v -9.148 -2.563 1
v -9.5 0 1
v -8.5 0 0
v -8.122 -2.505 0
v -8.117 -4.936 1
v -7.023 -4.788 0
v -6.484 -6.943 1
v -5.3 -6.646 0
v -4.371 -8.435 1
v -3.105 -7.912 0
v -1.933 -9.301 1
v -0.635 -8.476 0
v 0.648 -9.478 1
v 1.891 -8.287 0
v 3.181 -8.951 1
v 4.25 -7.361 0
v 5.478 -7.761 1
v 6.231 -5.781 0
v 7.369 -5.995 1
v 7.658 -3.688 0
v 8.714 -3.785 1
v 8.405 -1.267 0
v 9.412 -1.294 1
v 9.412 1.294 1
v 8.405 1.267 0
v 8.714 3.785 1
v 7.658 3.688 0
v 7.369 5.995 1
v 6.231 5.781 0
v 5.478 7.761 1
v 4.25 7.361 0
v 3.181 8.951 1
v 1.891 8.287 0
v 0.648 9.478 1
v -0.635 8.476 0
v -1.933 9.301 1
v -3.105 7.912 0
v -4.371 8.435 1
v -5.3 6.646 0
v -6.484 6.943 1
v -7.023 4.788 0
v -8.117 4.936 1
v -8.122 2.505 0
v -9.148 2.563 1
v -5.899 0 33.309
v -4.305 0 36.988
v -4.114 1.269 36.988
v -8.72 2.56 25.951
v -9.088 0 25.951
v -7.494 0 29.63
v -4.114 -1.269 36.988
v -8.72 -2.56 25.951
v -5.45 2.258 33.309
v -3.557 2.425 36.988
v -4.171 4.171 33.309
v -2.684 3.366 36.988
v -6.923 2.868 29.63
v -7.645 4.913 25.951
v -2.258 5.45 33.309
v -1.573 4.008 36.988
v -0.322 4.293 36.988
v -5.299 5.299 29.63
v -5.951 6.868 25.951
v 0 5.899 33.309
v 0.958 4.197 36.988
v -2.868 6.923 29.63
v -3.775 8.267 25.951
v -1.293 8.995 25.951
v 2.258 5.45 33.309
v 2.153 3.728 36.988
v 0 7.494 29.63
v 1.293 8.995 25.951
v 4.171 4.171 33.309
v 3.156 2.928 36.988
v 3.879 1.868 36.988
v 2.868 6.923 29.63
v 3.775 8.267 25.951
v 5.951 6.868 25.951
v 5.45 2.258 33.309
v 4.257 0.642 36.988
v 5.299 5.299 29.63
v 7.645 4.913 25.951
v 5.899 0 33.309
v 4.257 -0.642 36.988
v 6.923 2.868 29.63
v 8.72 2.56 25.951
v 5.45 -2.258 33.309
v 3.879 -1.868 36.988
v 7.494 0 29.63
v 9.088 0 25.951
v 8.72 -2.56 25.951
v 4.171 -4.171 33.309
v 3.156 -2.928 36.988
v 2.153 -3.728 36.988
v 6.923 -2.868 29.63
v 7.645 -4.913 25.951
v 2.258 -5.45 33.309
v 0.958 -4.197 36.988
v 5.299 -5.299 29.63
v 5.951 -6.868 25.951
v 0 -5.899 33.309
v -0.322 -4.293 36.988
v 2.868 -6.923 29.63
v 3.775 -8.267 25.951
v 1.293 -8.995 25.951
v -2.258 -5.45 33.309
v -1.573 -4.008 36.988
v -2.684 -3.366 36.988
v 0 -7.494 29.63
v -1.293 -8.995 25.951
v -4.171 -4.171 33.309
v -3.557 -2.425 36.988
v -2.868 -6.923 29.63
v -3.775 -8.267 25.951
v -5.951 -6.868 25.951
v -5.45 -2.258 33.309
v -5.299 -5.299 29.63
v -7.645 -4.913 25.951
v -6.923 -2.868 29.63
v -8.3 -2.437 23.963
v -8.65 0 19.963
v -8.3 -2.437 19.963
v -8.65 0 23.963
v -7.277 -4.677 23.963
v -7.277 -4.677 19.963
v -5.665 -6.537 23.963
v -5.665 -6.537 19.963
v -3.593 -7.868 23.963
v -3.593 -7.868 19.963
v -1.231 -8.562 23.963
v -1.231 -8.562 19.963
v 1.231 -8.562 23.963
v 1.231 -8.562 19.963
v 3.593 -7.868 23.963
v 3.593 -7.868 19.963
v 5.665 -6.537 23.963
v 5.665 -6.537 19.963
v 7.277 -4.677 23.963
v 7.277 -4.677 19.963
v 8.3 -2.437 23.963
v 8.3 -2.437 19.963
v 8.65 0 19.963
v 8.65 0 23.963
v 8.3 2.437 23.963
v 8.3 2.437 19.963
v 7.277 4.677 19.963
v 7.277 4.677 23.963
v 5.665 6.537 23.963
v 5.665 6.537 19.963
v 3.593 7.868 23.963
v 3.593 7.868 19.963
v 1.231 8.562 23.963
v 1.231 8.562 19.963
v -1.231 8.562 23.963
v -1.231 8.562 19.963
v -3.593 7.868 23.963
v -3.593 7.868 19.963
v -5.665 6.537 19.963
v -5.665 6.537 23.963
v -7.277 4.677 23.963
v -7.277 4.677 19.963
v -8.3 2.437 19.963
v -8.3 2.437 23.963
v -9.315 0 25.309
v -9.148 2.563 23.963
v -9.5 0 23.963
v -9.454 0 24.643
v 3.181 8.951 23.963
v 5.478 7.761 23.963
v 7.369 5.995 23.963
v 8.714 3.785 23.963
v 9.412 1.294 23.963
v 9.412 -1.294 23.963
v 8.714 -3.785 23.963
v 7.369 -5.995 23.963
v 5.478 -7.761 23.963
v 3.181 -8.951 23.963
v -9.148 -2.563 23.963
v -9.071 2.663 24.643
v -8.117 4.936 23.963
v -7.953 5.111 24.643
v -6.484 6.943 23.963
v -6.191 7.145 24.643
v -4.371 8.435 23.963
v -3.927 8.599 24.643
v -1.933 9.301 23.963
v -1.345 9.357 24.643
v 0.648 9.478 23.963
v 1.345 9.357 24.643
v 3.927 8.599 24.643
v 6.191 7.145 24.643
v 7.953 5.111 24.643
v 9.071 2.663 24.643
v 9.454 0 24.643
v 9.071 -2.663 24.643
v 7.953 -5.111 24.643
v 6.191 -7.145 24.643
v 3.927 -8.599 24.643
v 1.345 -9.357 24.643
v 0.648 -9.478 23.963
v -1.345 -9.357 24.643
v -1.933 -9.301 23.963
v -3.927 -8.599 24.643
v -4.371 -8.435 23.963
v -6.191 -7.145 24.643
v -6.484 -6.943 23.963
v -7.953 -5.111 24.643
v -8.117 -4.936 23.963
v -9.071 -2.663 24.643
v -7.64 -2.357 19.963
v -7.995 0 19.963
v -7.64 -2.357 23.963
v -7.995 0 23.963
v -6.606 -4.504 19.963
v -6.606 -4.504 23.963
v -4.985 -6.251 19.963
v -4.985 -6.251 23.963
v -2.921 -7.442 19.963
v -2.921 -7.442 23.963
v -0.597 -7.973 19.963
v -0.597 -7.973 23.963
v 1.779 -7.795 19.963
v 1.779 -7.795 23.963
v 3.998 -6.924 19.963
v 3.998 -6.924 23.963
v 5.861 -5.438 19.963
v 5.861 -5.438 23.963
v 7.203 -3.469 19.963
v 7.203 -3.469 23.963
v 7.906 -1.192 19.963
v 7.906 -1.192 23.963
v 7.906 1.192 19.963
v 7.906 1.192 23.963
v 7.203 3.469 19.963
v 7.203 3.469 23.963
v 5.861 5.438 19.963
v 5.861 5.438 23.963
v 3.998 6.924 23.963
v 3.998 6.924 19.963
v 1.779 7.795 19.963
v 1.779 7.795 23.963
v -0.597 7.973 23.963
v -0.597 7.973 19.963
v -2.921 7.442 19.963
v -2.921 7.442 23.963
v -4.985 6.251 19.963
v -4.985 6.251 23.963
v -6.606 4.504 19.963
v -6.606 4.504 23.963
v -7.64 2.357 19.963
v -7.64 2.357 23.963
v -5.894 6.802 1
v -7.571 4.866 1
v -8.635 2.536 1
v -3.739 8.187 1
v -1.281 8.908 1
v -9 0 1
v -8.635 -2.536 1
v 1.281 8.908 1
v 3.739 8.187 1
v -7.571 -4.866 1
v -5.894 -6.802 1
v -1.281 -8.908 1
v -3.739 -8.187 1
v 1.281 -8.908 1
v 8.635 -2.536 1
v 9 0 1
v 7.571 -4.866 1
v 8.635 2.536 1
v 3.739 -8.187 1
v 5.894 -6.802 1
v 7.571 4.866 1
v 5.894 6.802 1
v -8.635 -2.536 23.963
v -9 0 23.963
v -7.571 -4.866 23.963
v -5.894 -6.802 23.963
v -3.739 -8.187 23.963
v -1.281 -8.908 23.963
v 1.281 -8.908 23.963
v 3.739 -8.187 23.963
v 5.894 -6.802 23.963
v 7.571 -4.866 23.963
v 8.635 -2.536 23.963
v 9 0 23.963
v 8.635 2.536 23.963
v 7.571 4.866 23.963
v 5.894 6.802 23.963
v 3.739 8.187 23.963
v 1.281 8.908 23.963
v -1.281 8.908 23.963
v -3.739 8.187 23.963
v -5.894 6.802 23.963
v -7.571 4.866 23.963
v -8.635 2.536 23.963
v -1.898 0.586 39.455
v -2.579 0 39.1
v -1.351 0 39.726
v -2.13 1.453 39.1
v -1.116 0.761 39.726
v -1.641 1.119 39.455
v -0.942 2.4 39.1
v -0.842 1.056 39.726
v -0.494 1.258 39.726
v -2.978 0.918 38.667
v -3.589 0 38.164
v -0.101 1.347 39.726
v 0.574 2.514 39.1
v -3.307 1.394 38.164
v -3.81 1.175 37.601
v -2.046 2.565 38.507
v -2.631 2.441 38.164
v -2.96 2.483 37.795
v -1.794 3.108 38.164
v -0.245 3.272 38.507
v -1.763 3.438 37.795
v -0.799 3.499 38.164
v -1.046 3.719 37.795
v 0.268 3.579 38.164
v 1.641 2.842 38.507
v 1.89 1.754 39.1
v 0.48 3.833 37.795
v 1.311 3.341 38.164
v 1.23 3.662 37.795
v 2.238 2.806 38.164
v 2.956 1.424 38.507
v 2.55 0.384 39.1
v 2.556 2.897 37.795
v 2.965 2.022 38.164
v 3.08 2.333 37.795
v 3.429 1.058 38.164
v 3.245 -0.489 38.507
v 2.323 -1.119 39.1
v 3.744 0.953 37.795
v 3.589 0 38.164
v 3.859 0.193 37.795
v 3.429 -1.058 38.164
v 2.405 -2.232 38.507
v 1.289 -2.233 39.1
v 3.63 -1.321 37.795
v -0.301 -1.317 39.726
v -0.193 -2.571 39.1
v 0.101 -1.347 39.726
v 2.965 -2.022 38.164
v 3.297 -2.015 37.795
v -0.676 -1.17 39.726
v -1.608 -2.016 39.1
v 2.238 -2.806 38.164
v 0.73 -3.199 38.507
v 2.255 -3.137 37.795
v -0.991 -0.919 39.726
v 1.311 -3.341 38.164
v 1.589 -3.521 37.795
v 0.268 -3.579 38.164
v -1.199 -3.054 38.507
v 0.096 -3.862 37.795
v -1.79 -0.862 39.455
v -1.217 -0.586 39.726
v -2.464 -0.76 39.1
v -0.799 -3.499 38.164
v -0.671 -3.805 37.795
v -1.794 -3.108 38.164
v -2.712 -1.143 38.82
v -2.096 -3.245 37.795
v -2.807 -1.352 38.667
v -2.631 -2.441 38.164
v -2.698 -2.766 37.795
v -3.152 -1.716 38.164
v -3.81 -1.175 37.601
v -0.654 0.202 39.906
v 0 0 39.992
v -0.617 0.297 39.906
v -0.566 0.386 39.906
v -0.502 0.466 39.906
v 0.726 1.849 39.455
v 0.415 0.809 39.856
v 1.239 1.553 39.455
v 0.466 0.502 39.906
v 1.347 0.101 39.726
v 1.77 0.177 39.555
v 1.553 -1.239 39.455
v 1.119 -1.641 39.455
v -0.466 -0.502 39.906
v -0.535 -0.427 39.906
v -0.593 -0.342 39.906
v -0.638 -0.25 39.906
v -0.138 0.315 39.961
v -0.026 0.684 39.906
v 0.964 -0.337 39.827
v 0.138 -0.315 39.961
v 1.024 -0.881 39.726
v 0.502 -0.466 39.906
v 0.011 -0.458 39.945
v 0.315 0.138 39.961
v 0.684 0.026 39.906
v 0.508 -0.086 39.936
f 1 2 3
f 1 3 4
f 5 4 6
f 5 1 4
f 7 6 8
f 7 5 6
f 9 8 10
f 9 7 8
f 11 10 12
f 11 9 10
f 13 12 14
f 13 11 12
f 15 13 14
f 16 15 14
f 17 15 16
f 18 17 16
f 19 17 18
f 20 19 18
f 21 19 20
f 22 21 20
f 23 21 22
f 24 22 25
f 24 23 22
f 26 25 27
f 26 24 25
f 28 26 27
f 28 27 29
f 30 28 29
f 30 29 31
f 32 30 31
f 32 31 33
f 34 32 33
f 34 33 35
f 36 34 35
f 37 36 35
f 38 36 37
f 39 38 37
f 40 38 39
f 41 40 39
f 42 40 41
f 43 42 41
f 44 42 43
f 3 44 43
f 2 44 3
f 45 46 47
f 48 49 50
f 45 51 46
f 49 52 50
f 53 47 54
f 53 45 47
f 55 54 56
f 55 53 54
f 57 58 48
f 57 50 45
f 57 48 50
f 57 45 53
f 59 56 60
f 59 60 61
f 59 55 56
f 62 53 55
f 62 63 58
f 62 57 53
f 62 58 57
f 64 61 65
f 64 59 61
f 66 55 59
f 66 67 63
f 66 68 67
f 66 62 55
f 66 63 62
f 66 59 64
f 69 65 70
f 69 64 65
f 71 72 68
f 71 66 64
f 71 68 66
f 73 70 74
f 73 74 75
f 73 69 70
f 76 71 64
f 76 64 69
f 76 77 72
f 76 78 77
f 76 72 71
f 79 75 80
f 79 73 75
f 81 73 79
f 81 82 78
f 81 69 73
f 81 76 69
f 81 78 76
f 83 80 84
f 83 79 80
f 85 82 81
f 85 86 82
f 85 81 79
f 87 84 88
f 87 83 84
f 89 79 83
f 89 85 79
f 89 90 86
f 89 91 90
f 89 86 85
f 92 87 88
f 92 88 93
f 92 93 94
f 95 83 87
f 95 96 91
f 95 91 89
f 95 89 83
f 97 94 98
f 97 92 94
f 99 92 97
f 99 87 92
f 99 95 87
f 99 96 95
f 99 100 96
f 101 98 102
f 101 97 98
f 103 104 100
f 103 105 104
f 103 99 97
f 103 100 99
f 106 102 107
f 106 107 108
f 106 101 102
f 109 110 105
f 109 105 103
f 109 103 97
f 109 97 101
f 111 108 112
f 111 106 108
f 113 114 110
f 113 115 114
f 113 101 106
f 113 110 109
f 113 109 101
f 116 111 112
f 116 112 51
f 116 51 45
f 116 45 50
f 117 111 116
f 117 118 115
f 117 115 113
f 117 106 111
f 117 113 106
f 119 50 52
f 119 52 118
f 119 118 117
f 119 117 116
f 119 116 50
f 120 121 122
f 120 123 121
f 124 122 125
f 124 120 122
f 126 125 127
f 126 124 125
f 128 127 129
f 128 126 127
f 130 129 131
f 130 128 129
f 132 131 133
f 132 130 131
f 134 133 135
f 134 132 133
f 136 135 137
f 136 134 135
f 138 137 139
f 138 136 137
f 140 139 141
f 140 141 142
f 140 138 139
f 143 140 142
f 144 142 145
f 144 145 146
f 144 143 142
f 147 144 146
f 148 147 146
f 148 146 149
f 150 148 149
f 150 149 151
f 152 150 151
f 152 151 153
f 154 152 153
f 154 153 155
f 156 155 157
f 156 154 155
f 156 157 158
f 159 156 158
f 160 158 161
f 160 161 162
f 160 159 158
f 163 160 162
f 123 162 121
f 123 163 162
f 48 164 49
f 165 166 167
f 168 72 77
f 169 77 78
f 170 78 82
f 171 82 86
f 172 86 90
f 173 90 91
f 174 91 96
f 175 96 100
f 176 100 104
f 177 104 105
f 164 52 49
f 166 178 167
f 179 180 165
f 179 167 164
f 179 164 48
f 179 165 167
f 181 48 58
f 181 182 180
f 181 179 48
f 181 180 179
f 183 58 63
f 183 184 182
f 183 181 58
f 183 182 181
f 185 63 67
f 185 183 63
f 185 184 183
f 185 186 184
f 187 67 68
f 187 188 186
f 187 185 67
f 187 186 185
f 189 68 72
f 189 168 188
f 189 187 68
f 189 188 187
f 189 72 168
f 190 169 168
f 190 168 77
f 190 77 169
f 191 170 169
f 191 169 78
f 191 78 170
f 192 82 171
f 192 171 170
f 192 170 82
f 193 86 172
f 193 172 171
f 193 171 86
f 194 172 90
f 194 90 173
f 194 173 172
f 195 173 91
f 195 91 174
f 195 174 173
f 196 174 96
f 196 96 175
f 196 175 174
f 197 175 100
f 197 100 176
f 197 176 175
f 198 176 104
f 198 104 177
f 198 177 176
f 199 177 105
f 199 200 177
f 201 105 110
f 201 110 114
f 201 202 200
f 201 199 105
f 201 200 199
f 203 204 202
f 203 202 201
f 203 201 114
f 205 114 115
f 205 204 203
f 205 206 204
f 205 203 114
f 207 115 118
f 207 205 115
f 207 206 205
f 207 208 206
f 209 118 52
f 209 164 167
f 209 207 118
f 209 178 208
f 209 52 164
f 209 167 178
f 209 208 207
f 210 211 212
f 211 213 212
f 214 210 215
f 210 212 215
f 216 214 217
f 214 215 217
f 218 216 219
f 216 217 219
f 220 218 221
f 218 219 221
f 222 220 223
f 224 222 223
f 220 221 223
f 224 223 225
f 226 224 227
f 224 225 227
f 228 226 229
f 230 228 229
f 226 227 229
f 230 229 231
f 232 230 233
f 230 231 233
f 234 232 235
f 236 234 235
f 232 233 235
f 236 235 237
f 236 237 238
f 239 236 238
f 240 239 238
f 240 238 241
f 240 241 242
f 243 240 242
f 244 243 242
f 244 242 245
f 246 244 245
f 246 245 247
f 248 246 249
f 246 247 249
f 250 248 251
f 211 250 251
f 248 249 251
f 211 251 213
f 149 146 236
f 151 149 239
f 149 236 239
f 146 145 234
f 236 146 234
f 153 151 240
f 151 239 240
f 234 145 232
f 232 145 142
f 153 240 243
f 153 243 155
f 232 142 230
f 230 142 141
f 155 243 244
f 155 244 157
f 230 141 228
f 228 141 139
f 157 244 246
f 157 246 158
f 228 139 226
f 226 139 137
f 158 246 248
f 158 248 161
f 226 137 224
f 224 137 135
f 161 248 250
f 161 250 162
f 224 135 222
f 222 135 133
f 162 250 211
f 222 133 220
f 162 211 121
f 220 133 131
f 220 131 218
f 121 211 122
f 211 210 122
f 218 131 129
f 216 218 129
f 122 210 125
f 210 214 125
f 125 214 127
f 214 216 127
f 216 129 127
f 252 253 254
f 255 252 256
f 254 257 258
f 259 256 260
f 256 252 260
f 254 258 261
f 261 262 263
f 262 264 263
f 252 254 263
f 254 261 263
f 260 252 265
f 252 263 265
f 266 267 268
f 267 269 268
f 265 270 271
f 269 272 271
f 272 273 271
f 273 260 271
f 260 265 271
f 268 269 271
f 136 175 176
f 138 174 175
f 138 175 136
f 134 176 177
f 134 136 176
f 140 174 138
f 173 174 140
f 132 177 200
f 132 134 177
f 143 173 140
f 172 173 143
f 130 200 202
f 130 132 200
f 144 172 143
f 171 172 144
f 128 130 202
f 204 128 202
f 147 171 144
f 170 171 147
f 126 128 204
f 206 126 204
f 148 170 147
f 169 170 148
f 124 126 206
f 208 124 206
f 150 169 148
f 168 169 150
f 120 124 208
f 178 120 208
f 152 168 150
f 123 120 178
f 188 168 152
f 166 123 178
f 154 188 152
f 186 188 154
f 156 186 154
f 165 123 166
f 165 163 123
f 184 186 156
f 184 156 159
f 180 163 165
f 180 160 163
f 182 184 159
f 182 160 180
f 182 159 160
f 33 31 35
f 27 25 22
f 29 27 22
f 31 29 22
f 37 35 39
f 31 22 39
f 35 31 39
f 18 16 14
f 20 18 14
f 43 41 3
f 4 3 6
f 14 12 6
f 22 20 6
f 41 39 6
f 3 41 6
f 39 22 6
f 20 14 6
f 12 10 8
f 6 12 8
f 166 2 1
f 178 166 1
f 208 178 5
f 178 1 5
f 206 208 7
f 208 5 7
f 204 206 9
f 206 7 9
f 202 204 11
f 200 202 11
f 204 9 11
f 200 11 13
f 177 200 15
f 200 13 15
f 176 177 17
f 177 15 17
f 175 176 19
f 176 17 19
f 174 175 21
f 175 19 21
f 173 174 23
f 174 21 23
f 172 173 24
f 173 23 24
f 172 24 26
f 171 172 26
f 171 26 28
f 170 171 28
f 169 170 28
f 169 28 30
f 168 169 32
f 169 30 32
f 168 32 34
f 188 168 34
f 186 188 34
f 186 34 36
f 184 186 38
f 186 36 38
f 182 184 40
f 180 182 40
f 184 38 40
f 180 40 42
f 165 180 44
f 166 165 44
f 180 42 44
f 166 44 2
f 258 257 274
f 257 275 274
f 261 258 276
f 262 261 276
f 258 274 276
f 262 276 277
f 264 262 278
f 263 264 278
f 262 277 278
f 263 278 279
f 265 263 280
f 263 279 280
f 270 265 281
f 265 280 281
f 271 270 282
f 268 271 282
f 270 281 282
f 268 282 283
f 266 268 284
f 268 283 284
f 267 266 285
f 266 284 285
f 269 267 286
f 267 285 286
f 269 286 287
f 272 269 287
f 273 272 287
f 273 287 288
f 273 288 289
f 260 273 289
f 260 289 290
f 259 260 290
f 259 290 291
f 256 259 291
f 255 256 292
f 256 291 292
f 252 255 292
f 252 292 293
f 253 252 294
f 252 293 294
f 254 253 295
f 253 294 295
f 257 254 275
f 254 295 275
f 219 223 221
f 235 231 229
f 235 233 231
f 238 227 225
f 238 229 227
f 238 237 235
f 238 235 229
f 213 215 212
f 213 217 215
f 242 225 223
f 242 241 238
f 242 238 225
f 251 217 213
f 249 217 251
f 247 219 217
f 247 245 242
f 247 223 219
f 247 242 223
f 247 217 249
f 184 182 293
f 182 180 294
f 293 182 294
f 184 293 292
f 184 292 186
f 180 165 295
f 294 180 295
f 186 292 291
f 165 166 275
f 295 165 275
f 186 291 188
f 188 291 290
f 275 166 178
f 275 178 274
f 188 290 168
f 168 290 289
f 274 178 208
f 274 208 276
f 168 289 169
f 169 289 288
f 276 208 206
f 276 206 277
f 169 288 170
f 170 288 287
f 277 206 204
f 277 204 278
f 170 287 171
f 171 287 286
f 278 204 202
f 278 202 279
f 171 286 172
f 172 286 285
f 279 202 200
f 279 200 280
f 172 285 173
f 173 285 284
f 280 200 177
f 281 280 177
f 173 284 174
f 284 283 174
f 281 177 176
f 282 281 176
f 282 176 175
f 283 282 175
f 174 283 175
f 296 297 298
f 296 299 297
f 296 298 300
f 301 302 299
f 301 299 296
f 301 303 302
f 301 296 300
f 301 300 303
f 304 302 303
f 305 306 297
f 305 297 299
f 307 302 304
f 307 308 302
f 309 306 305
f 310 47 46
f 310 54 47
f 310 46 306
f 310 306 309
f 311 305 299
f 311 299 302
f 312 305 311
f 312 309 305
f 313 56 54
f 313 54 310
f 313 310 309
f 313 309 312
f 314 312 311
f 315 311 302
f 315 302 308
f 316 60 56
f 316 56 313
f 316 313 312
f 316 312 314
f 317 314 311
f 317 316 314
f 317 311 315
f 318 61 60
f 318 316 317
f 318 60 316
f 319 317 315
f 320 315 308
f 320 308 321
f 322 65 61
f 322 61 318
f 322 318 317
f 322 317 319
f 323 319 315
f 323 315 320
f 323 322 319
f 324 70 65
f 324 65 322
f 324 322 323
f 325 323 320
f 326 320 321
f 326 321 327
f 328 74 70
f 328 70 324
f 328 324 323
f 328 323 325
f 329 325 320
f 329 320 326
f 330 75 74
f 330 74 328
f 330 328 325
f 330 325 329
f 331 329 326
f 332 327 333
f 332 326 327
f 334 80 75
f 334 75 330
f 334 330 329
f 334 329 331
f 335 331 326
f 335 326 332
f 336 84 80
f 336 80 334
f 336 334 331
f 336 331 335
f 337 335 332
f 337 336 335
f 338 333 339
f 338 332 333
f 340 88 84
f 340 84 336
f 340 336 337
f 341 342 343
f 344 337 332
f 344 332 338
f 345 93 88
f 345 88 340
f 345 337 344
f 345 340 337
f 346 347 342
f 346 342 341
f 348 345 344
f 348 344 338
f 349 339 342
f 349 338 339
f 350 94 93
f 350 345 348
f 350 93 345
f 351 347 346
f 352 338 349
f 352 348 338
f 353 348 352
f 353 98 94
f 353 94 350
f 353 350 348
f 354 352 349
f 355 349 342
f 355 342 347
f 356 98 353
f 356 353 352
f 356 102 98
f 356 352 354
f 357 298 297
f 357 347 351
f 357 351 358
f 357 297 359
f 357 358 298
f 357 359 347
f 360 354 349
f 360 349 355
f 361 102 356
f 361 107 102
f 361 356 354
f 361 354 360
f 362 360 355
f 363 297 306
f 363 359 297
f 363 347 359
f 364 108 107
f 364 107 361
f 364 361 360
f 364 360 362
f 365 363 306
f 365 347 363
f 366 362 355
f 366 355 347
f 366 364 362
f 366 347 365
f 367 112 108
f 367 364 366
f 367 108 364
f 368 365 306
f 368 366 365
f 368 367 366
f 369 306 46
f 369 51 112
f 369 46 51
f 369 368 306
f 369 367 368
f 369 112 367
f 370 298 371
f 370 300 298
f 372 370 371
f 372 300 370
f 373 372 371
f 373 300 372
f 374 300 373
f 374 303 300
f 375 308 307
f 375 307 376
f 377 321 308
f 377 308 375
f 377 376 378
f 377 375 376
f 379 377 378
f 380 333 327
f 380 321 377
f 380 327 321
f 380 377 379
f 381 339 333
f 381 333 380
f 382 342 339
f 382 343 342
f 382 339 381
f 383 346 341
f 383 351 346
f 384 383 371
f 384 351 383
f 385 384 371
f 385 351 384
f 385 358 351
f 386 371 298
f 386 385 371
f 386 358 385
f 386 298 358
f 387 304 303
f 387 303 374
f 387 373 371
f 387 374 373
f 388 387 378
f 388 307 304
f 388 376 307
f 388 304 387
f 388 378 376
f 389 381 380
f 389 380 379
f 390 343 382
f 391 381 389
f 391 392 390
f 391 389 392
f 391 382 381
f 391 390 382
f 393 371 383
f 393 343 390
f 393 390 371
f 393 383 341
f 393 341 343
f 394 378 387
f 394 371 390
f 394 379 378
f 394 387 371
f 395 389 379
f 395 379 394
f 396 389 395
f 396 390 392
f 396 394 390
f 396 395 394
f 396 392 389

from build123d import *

# Parameters (mm, degrees)
F2_W    = 0.654929
F2_H    = 4
F5_SIZE = 1


with BuildPart() as f1:
    # F0 (on Front) → F1 (revolve)
    with BuildSketch(Plane.XZ):
        Polygon((-9.5, 0), (0, 0), (0, 1), (-9, 1), (-9, 23.963244), (-9.5, 23.963244), align=None)
    revolve(axis=Axis((0, 0, 7.5), (0, 0, 1)))

    # F5
    f5_edges = [f1.edges().sort_by_distance(p)[0] for p in [
        (9.5, 0, 0),
    ]]
    chamfer(f5_edges, length=F5_SIZE)


with BuildPart() as f3:
    # F0 (on Front) → F3 (revolve)
    with BuildSketch(Plane.XZ):
        with BuildLine():
            ThreePointArc((-9.087778, 25.951281), (-9.39586, 24.978406), (-9.5, 23.963244))
            Line((-9.5, 23.963244), (-9, 23.963244))
            Line((-9, 23.963244), (0, 23.963244))
            Line((0, 23.963244), (0, 39.992008))
            ThreePointArc((0, 39.992008), (-2.57854, 39.100477), (-4.305184, 36.988037))
            Line((-4.305184, 36.988037), (-9.087778, 25.951281))
        make_face()
    revolve(axis=Axis((0, 0, 27.5), (0, 0, -1)))

    # F2 (on face) → F4 (revolve)
    with BuildSketch(Plane.XZ):
        with Locations((-8.322536, 21.963244)):
            Rectangle(F2_W, F2_H)
    revolve(axis=Axis((0, 0, 7.5), (0, 0, 1)))


solid = Compound([f1.part, f3.part])
